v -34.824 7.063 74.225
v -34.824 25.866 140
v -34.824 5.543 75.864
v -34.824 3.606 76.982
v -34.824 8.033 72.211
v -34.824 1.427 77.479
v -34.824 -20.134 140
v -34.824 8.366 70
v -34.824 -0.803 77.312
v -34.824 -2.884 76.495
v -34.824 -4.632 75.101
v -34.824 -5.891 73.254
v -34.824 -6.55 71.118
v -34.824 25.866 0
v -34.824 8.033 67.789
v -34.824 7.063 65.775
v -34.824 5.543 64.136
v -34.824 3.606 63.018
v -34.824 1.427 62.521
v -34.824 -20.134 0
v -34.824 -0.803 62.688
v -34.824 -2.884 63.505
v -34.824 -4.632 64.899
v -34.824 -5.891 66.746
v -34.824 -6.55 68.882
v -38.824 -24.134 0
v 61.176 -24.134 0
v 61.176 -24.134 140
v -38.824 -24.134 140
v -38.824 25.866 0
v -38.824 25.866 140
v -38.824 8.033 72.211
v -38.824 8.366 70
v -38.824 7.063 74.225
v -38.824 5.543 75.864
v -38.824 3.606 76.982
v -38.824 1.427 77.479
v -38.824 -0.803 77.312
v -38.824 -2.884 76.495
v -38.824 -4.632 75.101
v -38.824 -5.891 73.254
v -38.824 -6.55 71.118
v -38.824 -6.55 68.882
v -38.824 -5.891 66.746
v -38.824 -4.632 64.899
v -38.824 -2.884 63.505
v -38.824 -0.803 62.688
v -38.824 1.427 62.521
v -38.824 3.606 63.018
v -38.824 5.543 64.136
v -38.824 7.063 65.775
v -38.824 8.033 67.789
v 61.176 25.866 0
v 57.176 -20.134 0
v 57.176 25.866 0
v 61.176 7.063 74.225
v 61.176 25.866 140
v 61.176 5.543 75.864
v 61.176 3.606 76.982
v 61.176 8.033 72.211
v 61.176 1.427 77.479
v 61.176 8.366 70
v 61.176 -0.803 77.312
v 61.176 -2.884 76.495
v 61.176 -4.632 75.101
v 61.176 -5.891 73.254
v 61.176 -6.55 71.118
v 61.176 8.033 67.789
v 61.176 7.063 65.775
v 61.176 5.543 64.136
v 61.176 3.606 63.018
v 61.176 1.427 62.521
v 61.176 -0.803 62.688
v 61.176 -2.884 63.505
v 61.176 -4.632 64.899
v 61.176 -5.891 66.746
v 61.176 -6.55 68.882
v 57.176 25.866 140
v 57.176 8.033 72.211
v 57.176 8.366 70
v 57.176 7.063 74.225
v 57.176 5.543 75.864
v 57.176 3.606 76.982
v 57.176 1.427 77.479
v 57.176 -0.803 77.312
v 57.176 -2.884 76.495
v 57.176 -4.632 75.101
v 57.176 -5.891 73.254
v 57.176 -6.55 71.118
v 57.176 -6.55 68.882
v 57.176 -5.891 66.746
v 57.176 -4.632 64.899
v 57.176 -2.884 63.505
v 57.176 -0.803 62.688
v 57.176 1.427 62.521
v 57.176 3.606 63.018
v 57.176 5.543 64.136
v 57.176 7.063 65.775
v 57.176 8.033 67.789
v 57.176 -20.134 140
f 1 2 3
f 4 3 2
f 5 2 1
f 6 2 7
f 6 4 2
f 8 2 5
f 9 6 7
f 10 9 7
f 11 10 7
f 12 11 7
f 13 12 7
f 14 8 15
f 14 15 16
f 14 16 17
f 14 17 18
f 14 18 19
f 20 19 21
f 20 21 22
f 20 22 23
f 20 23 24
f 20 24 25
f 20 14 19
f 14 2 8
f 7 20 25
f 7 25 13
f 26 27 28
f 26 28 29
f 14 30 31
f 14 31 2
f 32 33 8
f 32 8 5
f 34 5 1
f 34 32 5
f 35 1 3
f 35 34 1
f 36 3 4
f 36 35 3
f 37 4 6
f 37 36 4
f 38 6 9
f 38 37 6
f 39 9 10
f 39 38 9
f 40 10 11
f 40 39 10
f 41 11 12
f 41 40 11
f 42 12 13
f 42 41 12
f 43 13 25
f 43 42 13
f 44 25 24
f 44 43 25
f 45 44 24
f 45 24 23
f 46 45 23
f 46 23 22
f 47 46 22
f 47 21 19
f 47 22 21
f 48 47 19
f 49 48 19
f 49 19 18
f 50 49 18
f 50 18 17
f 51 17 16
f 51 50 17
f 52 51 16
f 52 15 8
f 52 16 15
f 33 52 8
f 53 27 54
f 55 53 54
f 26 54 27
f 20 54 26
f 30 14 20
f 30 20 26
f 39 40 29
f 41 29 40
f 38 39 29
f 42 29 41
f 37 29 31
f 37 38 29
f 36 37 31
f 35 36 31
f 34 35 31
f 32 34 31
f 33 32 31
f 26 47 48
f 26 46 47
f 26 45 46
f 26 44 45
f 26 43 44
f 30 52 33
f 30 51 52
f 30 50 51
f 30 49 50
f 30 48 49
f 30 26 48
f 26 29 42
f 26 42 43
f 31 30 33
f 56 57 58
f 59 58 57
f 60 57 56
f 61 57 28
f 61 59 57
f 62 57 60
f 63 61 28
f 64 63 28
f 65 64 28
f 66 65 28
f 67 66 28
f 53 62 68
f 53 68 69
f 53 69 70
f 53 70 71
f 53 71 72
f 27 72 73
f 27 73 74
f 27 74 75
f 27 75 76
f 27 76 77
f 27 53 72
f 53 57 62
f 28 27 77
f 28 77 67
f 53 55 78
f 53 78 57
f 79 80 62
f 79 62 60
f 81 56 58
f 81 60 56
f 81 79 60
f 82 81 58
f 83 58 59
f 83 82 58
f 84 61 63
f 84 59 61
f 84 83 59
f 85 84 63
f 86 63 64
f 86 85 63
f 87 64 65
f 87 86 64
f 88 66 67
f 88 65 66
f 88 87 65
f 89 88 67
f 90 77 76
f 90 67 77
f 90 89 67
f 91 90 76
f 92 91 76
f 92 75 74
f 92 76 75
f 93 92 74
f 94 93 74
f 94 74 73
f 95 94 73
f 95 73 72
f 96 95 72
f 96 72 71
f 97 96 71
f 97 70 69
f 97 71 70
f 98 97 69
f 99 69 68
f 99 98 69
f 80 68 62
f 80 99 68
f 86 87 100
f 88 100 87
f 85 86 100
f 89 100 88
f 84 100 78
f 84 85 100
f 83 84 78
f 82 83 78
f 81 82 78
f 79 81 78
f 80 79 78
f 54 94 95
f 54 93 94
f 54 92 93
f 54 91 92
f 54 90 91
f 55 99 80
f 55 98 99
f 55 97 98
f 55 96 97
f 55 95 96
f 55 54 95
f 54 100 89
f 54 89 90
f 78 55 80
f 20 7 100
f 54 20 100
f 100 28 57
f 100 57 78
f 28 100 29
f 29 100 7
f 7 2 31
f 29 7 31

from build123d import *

# Parameters (mm, degrees)
BOSS_EXTRUDE1_DEPTH     = 140
CUT_EXTRUDE1_DEPTH      = 174.980077517
CUT_EXTRUDE1_DEPTH_BACK = 174.980077517
SKETCH2_R               = 7.5


with BuildPart() as part:
    # Sketch1 → Boss-Extrude1 (new body)
    with BuildSketch(Plane.XY):
        Polygon((-38.824195441, 25.86633667), (-34.824195441, 25.86633667), (-34.824195441, -20.133663278), (57.175804455, -20.133663278), (57.175804455, 25.866336594), (61.175804559, 25.866336594), (61.175804559, -24.133663406), (-38.824195441, -24.133663406), align=None)
    extrude(amount=BOSS_EXTRUDE1_DEPTH)

    # Sketch2 → Cut-Extrude1 (cut, two sides: drawn at the far end of the back side and taken through both)
    with BuildSketch(Plane(origin=(61.175804559, 0, 0), x_dir=(0, 0, -1), z_dir=(1, 0, 0)).offset(-CUT_EXTRUDE1_DEPTH_BACK)):
        with Locations(Location((-70, 0.866336594, 0), (0, 0, 90))):
            Circle(SKETCH2_R)
    extrude(amount=CUT_EXTRUDE1_DEPTH + CUT_EXTRUDE1_DEPTH_BACK, mode=Mode.SUBTRACT)


solid = part.part
